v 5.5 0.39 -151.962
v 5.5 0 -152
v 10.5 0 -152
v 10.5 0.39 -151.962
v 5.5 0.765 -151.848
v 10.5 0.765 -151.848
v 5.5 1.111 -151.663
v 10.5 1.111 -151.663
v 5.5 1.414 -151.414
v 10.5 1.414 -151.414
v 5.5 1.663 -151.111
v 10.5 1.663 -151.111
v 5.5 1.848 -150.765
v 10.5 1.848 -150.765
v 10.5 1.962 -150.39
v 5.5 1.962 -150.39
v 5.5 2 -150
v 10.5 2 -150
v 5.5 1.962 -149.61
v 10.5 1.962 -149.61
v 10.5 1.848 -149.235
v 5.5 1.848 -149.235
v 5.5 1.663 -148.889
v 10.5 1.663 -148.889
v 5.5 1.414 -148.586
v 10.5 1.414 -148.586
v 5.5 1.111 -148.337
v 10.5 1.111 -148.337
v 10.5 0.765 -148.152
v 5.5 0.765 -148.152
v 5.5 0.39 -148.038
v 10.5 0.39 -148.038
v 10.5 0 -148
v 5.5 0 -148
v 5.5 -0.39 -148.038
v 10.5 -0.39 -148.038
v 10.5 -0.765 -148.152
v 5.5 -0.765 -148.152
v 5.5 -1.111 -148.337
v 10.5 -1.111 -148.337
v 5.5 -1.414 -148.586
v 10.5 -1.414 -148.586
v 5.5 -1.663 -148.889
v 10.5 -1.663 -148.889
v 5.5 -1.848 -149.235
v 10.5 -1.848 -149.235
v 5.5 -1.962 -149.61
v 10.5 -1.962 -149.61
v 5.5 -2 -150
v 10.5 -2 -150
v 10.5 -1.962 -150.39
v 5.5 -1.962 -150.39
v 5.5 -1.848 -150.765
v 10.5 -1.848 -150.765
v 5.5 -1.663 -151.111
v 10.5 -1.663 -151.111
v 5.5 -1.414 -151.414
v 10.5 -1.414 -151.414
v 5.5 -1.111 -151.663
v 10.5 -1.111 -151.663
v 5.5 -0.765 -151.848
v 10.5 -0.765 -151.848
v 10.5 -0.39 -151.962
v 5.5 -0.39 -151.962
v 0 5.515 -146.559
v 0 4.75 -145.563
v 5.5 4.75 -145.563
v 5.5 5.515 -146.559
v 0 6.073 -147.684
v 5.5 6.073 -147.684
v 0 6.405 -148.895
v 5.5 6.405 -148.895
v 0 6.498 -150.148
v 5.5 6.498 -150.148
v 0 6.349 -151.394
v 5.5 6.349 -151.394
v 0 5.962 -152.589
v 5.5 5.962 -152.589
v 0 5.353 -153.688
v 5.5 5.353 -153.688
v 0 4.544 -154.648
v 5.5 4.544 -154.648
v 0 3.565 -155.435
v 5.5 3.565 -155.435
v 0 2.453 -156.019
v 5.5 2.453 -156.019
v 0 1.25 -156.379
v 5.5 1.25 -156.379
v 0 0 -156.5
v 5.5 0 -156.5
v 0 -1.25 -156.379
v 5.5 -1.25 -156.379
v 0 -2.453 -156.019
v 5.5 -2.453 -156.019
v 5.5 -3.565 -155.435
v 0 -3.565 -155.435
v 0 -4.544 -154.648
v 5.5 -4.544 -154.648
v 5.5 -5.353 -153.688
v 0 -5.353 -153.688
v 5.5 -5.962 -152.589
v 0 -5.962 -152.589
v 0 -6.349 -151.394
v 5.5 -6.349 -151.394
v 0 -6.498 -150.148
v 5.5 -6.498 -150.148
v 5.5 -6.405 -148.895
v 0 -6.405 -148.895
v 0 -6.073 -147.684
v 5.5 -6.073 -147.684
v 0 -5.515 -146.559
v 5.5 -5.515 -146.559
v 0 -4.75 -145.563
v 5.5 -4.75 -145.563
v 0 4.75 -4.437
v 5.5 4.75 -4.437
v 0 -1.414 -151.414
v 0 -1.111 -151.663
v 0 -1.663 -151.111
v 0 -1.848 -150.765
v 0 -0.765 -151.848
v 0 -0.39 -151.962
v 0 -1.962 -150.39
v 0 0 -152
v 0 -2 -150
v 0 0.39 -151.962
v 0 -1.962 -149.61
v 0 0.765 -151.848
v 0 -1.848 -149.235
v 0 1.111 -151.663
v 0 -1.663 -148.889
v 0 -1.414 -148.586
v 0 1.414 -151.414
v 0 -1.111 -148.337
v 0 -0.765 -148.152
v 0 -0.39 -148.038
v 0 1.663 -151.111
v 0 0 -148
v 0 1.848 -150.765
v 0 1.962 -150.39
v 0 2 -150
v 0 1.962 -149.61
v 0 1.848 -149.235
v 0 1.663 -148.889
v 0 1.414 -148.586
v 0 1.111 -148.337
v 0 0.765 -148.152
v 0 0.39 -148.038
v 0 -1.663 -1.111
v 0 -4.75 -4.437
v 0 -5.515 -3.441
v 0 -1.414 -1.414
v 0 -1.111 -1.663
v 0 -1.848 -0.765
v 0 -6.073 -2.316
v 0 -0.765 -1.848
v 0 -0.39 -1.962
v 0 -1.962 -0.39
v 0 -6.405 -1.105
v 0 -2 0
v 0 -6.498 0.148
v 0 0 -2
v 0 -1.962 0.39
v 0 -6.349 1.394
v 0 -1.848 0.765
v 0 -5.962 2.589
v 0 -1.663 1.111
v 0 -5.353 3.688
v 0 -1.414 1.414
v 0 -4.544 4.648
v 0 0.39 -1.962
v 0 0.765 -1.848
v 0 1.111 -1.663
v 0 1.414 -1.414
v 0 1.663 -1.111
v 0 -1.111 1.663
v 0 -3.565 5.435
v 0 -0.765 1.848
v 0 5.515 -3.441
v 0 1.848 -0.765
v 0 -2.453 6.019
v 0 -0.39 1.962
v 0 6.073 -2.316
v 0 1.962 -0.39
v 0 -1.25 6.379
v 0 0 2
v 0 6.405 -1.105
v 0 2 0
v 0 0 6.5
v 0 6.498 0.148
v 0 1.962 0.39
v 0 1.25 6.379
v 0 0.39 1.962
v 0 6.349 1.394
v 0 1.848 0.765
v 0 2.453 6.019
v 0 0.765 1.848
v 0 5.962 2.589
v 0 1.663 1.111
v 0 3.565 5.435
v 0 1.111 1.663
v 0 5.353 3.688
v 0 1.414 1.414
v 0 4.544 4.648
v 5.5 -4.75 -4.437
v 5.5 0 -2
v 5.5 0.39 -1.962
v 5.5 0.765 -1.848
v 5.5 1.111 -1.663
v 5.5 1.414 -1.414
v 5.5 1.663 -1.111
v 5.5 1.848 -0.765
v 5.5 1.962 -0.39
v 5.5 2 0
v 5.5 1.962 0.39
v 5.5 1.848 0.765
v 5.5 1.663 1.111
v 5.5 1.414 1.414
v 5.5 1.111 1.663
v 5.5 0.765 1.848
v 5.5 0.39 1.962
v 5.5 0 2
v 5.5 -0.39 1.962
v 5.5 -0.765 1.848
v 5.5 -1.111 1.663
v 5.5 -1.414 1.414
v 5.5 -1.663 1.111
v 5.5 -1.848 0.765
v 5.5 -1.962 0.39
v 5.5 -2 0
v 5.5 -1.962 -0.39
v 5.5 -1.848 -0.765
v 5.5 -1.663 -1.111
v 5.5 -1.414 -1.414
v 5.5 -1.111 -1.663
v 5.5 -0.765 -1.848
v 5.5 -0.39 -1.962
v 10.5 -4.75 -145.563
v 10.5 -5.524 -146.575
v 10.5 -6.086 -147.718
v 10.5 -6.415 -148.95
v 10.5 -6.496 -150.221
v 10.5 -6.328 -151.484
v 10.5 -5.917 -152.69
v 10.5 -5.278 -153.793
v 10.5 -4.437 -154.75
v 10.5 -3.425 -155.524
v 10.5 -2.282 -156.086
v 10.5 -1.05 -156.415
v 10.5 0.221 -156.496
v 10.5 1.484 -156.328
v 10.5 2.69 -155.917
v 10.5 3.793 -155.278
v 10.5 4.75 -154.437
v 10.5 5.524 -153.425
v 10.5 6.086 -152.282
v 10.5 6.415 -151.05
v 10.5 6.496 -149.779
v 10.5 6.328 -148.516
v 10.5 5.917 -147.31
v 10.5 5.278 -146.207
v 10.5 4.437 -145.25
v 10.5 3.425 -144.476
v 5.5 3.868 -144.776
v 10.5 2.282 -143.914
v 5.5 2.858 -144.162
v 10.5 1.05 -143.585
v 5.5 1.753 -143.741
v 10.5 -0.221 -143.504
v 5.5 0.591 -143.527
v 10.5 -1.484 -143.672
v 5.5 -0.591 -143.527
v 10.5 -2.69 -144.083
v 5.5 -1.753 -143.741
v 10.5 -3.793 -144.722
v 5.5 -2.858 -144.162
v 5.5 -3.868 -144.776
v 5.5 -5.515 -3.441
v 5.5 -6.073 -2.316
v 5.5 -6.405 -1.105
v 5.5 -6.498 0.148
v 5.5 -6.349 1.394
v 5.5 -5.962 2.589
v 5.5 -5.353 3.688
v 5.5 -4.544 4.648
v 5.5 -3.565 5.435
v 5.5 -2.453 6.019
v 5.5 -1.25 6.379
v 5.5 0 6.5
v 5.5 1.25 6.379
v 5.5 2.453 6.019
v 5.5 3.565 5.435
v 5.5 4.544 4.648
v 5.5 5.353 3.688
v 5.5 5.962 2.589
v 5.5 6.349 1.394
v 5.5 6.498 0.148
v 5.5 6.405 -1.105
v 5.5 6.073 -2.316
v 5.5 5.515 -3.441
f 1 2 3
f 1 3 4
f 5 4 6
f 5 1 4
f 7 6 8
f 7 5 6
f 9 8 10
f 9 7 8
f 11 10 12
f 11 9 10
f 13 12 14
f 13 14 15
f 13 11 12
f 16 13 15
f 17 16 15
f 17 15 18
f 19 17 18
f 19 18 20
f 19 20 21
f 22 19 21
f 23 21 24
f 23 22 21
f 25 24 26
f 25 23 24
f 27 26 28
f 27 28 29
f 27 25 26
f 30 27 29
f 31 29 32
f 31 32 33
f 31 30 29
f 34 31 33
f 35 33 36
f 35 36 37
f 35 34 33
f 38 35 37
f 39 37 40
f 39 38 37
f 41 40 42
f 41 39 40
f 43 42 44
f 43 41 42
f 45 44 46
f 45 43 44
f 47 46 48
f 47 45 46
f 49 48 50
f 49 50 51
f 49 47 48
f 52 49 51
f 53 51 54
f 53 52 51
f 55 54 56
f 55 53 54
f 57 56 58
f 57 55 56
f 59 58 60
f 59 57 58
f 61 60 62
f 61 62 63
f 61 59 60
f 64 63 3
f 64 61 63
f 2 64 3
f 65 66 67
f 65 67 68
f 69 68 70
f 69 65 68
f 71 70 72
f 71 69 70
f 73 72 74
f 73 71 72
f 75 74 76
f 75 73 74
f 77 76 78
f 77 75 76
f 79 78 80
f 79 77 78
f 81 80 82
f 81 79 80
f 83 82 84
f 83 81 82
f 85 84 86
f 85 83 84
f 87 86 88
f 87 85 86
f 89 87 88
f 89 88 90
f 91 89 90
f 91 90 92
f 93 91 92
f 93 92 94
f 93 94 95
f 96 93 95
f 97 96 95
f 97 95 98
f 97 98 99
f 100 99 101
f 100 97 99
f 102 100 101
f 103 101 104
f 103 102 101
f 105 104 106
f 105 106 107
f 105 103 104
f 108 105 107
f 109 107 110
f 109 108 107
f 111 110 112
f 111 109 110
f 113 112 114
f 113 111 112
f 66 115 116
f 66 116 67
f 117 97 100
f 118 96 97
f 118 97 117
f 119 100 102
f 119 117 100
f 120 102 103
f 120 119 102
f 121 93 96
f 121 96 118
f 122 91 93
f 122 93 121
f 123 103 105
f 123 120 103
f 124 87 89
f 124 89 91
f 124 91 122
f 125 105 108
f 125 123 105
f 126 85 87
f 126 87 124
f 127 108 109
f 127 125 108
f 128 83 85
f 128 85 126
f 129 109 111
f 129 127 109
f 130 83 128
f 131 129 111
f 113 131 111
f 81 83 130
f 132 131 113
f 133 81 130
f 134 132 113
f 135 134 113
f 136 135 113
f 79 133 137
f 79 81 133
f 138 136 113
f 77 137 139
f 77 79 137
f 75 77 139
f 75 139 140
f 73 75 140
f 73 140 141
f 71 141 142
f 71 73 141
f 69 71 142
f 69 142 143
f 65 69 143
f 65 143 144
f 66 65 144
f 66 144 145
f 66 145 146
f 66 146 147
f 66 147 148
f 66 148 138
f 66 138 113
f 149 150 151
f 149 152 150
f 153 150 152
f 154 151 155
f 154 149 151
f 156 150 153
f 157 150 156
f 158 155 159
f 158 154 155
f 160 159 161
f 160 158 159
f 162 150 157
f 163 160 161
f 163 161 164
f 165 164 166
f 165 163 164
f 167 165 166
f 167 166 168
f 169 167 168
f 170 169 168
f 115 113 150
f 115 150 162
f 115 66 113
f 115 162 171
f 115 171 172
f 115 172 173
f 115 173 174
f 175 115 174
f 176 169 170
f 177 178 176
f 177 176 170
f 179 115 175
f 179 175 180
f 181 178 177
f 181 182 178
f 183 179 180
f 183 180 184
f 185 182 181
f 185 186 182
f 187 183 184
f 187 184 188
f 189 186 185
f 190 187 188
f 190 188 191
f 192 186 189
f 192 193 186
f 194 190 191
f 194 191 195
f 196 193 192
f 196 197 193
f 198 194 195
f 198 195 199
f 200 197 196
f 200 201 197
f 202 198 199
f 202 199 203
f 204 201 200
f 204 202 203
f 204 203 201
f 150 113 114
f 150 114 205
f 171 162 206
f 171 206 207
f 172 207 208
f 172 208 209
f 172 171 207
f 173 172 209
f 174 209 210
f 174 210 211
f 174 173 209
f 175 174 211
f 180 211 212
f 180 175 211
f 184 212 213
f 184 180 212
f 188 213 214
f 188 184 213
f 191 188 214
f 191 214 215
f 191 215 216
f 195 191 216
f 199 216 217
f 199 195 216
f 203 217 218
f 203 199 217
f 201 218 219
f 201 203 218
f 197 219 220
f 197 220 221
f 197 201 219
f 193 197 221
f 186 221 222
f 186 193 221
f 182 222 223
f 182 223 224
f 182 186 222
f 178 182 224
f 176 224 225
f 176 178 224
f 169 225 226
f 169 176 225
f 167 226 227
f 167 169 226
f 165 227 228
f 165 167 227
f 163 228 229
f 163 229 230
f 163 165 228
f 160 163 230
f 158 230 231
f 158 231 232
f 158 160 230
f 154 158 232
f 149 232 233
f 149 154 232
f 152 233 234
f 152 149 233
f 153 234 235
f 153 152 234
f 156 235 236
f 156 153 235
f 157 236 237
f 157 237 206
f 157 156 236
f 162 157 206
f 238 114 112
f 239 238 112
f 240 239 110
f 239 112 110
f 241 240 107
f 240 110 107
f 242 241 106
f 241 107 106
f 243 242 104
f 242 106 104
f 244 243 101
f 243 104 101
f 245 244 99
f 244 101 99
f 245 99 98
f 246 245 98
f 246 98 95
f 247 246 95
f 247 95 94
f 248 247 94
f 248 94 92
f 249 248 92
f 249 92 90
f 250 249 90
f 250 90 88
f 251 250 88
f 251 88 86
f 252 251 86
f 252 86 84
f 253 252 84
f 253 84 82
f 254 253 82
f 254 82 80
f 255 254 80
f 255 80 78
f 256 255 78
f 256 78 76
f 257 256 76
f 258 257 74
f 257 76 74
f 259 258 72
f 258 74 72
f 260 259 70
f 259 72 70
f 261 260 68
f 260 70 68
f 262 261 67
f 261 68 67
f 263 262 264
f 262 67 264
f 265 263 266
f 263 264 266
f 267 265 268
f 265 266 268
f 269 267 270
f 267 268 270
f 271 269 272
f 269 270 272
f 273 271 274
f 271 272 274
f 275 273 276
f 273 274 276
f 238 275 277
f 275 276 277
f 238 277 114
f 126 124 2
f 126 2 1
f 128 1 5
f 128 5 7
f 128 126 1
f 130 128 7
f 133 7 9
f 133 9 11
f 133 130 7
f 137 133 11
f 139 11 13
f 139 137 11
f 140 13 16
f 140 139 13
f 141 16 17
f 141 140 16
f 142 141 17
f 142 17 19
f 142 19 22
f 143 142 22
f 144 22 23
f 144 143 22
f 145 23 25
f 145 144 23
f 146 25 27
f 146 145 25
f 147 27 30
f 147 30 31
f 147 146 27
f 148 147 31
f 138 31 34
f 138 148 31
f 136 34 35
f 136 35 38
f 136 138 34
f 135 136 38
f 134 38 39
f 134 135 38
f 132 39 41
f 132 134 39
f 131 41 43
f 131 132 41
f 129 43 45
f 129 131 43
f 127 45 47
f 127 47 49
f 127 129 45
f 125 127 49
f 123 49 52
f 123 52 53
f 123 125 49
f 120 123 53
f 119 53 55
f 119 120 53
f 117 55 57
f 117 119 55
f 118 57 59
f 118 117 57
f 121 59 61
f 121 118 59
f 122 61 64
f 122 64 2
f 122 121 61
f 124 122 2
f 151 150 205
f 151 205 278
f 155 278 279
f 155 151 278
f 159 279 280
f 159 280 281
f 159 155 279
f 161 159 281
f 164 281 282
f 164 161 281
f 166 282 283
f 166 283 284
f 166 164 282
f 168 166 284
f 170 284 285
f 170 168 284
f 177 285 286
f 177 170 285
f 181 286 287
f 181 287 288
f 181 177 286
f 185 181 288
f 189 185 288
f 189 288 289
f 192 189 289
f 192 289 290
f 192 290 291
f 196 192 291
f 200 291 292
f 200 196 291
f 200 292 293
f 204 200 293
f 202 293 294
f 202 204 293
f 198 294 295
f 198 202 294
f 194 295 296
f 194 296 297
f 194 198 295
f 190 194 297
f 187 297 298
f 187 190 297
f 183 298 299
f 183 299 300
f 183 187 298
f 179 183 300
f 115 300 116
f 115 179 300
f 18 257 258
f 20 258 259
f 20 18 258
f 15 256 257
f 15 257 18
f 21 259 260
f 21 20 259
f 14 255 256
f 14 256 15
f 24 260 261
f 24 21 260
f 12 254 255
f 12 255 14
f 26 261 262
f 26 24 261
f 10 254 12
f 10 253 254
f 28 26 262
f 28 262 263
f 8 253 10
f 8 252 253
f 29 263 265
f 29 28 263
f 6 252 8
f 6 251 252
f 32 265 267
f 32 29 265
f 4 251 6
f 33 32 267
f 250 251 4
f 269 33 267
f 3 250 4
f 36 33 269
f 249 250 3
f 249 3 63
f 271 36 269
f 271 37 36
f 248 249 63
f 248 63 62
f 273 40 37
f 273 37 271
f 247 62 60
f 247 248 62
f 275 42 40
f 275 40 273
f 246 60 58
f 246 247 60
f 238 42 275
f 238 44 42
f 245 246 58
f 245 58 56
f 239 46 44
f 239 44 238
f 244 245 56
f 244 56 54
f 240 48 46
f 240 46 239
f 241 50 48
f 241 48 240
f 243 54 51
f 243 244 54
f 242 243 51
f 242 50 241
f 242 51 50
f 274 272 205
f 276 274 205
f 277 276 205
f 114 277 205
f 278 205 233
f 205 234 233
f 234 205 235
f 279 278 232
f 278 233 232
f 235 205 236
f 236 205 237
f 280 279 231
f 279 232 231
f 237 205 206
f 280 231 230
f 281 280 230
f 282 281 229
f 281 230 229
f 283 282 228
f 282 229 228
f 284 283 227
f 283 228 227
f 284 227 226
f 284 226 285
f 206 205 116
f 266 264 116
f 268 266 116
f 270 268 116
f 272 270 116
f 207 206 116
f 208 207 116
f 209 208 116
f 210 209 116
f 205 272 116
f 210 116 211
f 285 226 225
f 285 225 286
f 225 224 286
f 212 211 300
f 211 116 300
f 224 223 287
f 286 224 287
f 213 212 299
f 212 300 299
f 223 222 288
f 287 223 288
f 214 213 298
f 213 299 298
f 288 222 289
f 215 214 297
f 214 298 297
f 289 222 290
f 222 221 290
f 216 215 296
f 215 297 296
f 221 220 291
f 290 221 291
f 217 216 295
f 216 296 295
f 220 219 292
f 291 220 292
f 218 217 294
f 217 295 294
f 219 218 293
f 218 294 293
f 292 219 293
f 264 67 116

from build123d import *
from build123d.topology import SkipClean

# Parameters (mm, degrees)
SKETCH1_R           = 2
BOSS_EXTRUDE1_DEPTH = 5.5
SKETCH2_R           = 6.5
SKETCH2_R_2         = 2
BOSS_EXTRUDE3_DEPTH = 5


with BuildPart() as part:
    # Sketch1 → Boss-Extrude1 (new body)
    with BuildSketch(Plane(origin=(0, 0, 0), x_dir=(0, 0, -1), z_dir=(1, 0, 0))):
        with BuildLine():
            Line((4.437059837, 4.75), (145.562940163, 4.75))
            ThreePointArc((145.562940163, 4.75), (156.5, 0), (145.562940163, -4.75))
            Line((145.562940163, -4.75), (4.437059837, -4.75))
            ThreePointArc((4.437059837, -4.75), (-6.5, 0), (4.437059837, 4.75))
        make_face()
        Circle(SKETCH1_R, mode=Mode.SUBTRACT)
        with Locations((150, 0)):
            Circle(SKETCH1_R, mode=Mode.SUBTRACT)
    extrude(amount=BOSS_EXTRUDE1_DEPTH)

    # Sketch2 → Boss-Extrude3 (add)
    with SkipClean():  # the faces are left unmerged after this step: merging them gives an invalid solid
        with BuildSketch(Plane(origin=(5.5, 0, 0), x_dir=(0, 0, -1), z_dir=(1, 0, 0))):
            with Locations(Location((150, 0, 0), (0, 0, 226.9509202))):
                Circle(SKETCH2_R)
            with Locations((150, 0)):
                Circle(SKETCH2_R_2, mode=Mode.SUBTRACT)
        extrude(amount=BOSS_EXTRUDE3_DEPTH)


solid = part.part
